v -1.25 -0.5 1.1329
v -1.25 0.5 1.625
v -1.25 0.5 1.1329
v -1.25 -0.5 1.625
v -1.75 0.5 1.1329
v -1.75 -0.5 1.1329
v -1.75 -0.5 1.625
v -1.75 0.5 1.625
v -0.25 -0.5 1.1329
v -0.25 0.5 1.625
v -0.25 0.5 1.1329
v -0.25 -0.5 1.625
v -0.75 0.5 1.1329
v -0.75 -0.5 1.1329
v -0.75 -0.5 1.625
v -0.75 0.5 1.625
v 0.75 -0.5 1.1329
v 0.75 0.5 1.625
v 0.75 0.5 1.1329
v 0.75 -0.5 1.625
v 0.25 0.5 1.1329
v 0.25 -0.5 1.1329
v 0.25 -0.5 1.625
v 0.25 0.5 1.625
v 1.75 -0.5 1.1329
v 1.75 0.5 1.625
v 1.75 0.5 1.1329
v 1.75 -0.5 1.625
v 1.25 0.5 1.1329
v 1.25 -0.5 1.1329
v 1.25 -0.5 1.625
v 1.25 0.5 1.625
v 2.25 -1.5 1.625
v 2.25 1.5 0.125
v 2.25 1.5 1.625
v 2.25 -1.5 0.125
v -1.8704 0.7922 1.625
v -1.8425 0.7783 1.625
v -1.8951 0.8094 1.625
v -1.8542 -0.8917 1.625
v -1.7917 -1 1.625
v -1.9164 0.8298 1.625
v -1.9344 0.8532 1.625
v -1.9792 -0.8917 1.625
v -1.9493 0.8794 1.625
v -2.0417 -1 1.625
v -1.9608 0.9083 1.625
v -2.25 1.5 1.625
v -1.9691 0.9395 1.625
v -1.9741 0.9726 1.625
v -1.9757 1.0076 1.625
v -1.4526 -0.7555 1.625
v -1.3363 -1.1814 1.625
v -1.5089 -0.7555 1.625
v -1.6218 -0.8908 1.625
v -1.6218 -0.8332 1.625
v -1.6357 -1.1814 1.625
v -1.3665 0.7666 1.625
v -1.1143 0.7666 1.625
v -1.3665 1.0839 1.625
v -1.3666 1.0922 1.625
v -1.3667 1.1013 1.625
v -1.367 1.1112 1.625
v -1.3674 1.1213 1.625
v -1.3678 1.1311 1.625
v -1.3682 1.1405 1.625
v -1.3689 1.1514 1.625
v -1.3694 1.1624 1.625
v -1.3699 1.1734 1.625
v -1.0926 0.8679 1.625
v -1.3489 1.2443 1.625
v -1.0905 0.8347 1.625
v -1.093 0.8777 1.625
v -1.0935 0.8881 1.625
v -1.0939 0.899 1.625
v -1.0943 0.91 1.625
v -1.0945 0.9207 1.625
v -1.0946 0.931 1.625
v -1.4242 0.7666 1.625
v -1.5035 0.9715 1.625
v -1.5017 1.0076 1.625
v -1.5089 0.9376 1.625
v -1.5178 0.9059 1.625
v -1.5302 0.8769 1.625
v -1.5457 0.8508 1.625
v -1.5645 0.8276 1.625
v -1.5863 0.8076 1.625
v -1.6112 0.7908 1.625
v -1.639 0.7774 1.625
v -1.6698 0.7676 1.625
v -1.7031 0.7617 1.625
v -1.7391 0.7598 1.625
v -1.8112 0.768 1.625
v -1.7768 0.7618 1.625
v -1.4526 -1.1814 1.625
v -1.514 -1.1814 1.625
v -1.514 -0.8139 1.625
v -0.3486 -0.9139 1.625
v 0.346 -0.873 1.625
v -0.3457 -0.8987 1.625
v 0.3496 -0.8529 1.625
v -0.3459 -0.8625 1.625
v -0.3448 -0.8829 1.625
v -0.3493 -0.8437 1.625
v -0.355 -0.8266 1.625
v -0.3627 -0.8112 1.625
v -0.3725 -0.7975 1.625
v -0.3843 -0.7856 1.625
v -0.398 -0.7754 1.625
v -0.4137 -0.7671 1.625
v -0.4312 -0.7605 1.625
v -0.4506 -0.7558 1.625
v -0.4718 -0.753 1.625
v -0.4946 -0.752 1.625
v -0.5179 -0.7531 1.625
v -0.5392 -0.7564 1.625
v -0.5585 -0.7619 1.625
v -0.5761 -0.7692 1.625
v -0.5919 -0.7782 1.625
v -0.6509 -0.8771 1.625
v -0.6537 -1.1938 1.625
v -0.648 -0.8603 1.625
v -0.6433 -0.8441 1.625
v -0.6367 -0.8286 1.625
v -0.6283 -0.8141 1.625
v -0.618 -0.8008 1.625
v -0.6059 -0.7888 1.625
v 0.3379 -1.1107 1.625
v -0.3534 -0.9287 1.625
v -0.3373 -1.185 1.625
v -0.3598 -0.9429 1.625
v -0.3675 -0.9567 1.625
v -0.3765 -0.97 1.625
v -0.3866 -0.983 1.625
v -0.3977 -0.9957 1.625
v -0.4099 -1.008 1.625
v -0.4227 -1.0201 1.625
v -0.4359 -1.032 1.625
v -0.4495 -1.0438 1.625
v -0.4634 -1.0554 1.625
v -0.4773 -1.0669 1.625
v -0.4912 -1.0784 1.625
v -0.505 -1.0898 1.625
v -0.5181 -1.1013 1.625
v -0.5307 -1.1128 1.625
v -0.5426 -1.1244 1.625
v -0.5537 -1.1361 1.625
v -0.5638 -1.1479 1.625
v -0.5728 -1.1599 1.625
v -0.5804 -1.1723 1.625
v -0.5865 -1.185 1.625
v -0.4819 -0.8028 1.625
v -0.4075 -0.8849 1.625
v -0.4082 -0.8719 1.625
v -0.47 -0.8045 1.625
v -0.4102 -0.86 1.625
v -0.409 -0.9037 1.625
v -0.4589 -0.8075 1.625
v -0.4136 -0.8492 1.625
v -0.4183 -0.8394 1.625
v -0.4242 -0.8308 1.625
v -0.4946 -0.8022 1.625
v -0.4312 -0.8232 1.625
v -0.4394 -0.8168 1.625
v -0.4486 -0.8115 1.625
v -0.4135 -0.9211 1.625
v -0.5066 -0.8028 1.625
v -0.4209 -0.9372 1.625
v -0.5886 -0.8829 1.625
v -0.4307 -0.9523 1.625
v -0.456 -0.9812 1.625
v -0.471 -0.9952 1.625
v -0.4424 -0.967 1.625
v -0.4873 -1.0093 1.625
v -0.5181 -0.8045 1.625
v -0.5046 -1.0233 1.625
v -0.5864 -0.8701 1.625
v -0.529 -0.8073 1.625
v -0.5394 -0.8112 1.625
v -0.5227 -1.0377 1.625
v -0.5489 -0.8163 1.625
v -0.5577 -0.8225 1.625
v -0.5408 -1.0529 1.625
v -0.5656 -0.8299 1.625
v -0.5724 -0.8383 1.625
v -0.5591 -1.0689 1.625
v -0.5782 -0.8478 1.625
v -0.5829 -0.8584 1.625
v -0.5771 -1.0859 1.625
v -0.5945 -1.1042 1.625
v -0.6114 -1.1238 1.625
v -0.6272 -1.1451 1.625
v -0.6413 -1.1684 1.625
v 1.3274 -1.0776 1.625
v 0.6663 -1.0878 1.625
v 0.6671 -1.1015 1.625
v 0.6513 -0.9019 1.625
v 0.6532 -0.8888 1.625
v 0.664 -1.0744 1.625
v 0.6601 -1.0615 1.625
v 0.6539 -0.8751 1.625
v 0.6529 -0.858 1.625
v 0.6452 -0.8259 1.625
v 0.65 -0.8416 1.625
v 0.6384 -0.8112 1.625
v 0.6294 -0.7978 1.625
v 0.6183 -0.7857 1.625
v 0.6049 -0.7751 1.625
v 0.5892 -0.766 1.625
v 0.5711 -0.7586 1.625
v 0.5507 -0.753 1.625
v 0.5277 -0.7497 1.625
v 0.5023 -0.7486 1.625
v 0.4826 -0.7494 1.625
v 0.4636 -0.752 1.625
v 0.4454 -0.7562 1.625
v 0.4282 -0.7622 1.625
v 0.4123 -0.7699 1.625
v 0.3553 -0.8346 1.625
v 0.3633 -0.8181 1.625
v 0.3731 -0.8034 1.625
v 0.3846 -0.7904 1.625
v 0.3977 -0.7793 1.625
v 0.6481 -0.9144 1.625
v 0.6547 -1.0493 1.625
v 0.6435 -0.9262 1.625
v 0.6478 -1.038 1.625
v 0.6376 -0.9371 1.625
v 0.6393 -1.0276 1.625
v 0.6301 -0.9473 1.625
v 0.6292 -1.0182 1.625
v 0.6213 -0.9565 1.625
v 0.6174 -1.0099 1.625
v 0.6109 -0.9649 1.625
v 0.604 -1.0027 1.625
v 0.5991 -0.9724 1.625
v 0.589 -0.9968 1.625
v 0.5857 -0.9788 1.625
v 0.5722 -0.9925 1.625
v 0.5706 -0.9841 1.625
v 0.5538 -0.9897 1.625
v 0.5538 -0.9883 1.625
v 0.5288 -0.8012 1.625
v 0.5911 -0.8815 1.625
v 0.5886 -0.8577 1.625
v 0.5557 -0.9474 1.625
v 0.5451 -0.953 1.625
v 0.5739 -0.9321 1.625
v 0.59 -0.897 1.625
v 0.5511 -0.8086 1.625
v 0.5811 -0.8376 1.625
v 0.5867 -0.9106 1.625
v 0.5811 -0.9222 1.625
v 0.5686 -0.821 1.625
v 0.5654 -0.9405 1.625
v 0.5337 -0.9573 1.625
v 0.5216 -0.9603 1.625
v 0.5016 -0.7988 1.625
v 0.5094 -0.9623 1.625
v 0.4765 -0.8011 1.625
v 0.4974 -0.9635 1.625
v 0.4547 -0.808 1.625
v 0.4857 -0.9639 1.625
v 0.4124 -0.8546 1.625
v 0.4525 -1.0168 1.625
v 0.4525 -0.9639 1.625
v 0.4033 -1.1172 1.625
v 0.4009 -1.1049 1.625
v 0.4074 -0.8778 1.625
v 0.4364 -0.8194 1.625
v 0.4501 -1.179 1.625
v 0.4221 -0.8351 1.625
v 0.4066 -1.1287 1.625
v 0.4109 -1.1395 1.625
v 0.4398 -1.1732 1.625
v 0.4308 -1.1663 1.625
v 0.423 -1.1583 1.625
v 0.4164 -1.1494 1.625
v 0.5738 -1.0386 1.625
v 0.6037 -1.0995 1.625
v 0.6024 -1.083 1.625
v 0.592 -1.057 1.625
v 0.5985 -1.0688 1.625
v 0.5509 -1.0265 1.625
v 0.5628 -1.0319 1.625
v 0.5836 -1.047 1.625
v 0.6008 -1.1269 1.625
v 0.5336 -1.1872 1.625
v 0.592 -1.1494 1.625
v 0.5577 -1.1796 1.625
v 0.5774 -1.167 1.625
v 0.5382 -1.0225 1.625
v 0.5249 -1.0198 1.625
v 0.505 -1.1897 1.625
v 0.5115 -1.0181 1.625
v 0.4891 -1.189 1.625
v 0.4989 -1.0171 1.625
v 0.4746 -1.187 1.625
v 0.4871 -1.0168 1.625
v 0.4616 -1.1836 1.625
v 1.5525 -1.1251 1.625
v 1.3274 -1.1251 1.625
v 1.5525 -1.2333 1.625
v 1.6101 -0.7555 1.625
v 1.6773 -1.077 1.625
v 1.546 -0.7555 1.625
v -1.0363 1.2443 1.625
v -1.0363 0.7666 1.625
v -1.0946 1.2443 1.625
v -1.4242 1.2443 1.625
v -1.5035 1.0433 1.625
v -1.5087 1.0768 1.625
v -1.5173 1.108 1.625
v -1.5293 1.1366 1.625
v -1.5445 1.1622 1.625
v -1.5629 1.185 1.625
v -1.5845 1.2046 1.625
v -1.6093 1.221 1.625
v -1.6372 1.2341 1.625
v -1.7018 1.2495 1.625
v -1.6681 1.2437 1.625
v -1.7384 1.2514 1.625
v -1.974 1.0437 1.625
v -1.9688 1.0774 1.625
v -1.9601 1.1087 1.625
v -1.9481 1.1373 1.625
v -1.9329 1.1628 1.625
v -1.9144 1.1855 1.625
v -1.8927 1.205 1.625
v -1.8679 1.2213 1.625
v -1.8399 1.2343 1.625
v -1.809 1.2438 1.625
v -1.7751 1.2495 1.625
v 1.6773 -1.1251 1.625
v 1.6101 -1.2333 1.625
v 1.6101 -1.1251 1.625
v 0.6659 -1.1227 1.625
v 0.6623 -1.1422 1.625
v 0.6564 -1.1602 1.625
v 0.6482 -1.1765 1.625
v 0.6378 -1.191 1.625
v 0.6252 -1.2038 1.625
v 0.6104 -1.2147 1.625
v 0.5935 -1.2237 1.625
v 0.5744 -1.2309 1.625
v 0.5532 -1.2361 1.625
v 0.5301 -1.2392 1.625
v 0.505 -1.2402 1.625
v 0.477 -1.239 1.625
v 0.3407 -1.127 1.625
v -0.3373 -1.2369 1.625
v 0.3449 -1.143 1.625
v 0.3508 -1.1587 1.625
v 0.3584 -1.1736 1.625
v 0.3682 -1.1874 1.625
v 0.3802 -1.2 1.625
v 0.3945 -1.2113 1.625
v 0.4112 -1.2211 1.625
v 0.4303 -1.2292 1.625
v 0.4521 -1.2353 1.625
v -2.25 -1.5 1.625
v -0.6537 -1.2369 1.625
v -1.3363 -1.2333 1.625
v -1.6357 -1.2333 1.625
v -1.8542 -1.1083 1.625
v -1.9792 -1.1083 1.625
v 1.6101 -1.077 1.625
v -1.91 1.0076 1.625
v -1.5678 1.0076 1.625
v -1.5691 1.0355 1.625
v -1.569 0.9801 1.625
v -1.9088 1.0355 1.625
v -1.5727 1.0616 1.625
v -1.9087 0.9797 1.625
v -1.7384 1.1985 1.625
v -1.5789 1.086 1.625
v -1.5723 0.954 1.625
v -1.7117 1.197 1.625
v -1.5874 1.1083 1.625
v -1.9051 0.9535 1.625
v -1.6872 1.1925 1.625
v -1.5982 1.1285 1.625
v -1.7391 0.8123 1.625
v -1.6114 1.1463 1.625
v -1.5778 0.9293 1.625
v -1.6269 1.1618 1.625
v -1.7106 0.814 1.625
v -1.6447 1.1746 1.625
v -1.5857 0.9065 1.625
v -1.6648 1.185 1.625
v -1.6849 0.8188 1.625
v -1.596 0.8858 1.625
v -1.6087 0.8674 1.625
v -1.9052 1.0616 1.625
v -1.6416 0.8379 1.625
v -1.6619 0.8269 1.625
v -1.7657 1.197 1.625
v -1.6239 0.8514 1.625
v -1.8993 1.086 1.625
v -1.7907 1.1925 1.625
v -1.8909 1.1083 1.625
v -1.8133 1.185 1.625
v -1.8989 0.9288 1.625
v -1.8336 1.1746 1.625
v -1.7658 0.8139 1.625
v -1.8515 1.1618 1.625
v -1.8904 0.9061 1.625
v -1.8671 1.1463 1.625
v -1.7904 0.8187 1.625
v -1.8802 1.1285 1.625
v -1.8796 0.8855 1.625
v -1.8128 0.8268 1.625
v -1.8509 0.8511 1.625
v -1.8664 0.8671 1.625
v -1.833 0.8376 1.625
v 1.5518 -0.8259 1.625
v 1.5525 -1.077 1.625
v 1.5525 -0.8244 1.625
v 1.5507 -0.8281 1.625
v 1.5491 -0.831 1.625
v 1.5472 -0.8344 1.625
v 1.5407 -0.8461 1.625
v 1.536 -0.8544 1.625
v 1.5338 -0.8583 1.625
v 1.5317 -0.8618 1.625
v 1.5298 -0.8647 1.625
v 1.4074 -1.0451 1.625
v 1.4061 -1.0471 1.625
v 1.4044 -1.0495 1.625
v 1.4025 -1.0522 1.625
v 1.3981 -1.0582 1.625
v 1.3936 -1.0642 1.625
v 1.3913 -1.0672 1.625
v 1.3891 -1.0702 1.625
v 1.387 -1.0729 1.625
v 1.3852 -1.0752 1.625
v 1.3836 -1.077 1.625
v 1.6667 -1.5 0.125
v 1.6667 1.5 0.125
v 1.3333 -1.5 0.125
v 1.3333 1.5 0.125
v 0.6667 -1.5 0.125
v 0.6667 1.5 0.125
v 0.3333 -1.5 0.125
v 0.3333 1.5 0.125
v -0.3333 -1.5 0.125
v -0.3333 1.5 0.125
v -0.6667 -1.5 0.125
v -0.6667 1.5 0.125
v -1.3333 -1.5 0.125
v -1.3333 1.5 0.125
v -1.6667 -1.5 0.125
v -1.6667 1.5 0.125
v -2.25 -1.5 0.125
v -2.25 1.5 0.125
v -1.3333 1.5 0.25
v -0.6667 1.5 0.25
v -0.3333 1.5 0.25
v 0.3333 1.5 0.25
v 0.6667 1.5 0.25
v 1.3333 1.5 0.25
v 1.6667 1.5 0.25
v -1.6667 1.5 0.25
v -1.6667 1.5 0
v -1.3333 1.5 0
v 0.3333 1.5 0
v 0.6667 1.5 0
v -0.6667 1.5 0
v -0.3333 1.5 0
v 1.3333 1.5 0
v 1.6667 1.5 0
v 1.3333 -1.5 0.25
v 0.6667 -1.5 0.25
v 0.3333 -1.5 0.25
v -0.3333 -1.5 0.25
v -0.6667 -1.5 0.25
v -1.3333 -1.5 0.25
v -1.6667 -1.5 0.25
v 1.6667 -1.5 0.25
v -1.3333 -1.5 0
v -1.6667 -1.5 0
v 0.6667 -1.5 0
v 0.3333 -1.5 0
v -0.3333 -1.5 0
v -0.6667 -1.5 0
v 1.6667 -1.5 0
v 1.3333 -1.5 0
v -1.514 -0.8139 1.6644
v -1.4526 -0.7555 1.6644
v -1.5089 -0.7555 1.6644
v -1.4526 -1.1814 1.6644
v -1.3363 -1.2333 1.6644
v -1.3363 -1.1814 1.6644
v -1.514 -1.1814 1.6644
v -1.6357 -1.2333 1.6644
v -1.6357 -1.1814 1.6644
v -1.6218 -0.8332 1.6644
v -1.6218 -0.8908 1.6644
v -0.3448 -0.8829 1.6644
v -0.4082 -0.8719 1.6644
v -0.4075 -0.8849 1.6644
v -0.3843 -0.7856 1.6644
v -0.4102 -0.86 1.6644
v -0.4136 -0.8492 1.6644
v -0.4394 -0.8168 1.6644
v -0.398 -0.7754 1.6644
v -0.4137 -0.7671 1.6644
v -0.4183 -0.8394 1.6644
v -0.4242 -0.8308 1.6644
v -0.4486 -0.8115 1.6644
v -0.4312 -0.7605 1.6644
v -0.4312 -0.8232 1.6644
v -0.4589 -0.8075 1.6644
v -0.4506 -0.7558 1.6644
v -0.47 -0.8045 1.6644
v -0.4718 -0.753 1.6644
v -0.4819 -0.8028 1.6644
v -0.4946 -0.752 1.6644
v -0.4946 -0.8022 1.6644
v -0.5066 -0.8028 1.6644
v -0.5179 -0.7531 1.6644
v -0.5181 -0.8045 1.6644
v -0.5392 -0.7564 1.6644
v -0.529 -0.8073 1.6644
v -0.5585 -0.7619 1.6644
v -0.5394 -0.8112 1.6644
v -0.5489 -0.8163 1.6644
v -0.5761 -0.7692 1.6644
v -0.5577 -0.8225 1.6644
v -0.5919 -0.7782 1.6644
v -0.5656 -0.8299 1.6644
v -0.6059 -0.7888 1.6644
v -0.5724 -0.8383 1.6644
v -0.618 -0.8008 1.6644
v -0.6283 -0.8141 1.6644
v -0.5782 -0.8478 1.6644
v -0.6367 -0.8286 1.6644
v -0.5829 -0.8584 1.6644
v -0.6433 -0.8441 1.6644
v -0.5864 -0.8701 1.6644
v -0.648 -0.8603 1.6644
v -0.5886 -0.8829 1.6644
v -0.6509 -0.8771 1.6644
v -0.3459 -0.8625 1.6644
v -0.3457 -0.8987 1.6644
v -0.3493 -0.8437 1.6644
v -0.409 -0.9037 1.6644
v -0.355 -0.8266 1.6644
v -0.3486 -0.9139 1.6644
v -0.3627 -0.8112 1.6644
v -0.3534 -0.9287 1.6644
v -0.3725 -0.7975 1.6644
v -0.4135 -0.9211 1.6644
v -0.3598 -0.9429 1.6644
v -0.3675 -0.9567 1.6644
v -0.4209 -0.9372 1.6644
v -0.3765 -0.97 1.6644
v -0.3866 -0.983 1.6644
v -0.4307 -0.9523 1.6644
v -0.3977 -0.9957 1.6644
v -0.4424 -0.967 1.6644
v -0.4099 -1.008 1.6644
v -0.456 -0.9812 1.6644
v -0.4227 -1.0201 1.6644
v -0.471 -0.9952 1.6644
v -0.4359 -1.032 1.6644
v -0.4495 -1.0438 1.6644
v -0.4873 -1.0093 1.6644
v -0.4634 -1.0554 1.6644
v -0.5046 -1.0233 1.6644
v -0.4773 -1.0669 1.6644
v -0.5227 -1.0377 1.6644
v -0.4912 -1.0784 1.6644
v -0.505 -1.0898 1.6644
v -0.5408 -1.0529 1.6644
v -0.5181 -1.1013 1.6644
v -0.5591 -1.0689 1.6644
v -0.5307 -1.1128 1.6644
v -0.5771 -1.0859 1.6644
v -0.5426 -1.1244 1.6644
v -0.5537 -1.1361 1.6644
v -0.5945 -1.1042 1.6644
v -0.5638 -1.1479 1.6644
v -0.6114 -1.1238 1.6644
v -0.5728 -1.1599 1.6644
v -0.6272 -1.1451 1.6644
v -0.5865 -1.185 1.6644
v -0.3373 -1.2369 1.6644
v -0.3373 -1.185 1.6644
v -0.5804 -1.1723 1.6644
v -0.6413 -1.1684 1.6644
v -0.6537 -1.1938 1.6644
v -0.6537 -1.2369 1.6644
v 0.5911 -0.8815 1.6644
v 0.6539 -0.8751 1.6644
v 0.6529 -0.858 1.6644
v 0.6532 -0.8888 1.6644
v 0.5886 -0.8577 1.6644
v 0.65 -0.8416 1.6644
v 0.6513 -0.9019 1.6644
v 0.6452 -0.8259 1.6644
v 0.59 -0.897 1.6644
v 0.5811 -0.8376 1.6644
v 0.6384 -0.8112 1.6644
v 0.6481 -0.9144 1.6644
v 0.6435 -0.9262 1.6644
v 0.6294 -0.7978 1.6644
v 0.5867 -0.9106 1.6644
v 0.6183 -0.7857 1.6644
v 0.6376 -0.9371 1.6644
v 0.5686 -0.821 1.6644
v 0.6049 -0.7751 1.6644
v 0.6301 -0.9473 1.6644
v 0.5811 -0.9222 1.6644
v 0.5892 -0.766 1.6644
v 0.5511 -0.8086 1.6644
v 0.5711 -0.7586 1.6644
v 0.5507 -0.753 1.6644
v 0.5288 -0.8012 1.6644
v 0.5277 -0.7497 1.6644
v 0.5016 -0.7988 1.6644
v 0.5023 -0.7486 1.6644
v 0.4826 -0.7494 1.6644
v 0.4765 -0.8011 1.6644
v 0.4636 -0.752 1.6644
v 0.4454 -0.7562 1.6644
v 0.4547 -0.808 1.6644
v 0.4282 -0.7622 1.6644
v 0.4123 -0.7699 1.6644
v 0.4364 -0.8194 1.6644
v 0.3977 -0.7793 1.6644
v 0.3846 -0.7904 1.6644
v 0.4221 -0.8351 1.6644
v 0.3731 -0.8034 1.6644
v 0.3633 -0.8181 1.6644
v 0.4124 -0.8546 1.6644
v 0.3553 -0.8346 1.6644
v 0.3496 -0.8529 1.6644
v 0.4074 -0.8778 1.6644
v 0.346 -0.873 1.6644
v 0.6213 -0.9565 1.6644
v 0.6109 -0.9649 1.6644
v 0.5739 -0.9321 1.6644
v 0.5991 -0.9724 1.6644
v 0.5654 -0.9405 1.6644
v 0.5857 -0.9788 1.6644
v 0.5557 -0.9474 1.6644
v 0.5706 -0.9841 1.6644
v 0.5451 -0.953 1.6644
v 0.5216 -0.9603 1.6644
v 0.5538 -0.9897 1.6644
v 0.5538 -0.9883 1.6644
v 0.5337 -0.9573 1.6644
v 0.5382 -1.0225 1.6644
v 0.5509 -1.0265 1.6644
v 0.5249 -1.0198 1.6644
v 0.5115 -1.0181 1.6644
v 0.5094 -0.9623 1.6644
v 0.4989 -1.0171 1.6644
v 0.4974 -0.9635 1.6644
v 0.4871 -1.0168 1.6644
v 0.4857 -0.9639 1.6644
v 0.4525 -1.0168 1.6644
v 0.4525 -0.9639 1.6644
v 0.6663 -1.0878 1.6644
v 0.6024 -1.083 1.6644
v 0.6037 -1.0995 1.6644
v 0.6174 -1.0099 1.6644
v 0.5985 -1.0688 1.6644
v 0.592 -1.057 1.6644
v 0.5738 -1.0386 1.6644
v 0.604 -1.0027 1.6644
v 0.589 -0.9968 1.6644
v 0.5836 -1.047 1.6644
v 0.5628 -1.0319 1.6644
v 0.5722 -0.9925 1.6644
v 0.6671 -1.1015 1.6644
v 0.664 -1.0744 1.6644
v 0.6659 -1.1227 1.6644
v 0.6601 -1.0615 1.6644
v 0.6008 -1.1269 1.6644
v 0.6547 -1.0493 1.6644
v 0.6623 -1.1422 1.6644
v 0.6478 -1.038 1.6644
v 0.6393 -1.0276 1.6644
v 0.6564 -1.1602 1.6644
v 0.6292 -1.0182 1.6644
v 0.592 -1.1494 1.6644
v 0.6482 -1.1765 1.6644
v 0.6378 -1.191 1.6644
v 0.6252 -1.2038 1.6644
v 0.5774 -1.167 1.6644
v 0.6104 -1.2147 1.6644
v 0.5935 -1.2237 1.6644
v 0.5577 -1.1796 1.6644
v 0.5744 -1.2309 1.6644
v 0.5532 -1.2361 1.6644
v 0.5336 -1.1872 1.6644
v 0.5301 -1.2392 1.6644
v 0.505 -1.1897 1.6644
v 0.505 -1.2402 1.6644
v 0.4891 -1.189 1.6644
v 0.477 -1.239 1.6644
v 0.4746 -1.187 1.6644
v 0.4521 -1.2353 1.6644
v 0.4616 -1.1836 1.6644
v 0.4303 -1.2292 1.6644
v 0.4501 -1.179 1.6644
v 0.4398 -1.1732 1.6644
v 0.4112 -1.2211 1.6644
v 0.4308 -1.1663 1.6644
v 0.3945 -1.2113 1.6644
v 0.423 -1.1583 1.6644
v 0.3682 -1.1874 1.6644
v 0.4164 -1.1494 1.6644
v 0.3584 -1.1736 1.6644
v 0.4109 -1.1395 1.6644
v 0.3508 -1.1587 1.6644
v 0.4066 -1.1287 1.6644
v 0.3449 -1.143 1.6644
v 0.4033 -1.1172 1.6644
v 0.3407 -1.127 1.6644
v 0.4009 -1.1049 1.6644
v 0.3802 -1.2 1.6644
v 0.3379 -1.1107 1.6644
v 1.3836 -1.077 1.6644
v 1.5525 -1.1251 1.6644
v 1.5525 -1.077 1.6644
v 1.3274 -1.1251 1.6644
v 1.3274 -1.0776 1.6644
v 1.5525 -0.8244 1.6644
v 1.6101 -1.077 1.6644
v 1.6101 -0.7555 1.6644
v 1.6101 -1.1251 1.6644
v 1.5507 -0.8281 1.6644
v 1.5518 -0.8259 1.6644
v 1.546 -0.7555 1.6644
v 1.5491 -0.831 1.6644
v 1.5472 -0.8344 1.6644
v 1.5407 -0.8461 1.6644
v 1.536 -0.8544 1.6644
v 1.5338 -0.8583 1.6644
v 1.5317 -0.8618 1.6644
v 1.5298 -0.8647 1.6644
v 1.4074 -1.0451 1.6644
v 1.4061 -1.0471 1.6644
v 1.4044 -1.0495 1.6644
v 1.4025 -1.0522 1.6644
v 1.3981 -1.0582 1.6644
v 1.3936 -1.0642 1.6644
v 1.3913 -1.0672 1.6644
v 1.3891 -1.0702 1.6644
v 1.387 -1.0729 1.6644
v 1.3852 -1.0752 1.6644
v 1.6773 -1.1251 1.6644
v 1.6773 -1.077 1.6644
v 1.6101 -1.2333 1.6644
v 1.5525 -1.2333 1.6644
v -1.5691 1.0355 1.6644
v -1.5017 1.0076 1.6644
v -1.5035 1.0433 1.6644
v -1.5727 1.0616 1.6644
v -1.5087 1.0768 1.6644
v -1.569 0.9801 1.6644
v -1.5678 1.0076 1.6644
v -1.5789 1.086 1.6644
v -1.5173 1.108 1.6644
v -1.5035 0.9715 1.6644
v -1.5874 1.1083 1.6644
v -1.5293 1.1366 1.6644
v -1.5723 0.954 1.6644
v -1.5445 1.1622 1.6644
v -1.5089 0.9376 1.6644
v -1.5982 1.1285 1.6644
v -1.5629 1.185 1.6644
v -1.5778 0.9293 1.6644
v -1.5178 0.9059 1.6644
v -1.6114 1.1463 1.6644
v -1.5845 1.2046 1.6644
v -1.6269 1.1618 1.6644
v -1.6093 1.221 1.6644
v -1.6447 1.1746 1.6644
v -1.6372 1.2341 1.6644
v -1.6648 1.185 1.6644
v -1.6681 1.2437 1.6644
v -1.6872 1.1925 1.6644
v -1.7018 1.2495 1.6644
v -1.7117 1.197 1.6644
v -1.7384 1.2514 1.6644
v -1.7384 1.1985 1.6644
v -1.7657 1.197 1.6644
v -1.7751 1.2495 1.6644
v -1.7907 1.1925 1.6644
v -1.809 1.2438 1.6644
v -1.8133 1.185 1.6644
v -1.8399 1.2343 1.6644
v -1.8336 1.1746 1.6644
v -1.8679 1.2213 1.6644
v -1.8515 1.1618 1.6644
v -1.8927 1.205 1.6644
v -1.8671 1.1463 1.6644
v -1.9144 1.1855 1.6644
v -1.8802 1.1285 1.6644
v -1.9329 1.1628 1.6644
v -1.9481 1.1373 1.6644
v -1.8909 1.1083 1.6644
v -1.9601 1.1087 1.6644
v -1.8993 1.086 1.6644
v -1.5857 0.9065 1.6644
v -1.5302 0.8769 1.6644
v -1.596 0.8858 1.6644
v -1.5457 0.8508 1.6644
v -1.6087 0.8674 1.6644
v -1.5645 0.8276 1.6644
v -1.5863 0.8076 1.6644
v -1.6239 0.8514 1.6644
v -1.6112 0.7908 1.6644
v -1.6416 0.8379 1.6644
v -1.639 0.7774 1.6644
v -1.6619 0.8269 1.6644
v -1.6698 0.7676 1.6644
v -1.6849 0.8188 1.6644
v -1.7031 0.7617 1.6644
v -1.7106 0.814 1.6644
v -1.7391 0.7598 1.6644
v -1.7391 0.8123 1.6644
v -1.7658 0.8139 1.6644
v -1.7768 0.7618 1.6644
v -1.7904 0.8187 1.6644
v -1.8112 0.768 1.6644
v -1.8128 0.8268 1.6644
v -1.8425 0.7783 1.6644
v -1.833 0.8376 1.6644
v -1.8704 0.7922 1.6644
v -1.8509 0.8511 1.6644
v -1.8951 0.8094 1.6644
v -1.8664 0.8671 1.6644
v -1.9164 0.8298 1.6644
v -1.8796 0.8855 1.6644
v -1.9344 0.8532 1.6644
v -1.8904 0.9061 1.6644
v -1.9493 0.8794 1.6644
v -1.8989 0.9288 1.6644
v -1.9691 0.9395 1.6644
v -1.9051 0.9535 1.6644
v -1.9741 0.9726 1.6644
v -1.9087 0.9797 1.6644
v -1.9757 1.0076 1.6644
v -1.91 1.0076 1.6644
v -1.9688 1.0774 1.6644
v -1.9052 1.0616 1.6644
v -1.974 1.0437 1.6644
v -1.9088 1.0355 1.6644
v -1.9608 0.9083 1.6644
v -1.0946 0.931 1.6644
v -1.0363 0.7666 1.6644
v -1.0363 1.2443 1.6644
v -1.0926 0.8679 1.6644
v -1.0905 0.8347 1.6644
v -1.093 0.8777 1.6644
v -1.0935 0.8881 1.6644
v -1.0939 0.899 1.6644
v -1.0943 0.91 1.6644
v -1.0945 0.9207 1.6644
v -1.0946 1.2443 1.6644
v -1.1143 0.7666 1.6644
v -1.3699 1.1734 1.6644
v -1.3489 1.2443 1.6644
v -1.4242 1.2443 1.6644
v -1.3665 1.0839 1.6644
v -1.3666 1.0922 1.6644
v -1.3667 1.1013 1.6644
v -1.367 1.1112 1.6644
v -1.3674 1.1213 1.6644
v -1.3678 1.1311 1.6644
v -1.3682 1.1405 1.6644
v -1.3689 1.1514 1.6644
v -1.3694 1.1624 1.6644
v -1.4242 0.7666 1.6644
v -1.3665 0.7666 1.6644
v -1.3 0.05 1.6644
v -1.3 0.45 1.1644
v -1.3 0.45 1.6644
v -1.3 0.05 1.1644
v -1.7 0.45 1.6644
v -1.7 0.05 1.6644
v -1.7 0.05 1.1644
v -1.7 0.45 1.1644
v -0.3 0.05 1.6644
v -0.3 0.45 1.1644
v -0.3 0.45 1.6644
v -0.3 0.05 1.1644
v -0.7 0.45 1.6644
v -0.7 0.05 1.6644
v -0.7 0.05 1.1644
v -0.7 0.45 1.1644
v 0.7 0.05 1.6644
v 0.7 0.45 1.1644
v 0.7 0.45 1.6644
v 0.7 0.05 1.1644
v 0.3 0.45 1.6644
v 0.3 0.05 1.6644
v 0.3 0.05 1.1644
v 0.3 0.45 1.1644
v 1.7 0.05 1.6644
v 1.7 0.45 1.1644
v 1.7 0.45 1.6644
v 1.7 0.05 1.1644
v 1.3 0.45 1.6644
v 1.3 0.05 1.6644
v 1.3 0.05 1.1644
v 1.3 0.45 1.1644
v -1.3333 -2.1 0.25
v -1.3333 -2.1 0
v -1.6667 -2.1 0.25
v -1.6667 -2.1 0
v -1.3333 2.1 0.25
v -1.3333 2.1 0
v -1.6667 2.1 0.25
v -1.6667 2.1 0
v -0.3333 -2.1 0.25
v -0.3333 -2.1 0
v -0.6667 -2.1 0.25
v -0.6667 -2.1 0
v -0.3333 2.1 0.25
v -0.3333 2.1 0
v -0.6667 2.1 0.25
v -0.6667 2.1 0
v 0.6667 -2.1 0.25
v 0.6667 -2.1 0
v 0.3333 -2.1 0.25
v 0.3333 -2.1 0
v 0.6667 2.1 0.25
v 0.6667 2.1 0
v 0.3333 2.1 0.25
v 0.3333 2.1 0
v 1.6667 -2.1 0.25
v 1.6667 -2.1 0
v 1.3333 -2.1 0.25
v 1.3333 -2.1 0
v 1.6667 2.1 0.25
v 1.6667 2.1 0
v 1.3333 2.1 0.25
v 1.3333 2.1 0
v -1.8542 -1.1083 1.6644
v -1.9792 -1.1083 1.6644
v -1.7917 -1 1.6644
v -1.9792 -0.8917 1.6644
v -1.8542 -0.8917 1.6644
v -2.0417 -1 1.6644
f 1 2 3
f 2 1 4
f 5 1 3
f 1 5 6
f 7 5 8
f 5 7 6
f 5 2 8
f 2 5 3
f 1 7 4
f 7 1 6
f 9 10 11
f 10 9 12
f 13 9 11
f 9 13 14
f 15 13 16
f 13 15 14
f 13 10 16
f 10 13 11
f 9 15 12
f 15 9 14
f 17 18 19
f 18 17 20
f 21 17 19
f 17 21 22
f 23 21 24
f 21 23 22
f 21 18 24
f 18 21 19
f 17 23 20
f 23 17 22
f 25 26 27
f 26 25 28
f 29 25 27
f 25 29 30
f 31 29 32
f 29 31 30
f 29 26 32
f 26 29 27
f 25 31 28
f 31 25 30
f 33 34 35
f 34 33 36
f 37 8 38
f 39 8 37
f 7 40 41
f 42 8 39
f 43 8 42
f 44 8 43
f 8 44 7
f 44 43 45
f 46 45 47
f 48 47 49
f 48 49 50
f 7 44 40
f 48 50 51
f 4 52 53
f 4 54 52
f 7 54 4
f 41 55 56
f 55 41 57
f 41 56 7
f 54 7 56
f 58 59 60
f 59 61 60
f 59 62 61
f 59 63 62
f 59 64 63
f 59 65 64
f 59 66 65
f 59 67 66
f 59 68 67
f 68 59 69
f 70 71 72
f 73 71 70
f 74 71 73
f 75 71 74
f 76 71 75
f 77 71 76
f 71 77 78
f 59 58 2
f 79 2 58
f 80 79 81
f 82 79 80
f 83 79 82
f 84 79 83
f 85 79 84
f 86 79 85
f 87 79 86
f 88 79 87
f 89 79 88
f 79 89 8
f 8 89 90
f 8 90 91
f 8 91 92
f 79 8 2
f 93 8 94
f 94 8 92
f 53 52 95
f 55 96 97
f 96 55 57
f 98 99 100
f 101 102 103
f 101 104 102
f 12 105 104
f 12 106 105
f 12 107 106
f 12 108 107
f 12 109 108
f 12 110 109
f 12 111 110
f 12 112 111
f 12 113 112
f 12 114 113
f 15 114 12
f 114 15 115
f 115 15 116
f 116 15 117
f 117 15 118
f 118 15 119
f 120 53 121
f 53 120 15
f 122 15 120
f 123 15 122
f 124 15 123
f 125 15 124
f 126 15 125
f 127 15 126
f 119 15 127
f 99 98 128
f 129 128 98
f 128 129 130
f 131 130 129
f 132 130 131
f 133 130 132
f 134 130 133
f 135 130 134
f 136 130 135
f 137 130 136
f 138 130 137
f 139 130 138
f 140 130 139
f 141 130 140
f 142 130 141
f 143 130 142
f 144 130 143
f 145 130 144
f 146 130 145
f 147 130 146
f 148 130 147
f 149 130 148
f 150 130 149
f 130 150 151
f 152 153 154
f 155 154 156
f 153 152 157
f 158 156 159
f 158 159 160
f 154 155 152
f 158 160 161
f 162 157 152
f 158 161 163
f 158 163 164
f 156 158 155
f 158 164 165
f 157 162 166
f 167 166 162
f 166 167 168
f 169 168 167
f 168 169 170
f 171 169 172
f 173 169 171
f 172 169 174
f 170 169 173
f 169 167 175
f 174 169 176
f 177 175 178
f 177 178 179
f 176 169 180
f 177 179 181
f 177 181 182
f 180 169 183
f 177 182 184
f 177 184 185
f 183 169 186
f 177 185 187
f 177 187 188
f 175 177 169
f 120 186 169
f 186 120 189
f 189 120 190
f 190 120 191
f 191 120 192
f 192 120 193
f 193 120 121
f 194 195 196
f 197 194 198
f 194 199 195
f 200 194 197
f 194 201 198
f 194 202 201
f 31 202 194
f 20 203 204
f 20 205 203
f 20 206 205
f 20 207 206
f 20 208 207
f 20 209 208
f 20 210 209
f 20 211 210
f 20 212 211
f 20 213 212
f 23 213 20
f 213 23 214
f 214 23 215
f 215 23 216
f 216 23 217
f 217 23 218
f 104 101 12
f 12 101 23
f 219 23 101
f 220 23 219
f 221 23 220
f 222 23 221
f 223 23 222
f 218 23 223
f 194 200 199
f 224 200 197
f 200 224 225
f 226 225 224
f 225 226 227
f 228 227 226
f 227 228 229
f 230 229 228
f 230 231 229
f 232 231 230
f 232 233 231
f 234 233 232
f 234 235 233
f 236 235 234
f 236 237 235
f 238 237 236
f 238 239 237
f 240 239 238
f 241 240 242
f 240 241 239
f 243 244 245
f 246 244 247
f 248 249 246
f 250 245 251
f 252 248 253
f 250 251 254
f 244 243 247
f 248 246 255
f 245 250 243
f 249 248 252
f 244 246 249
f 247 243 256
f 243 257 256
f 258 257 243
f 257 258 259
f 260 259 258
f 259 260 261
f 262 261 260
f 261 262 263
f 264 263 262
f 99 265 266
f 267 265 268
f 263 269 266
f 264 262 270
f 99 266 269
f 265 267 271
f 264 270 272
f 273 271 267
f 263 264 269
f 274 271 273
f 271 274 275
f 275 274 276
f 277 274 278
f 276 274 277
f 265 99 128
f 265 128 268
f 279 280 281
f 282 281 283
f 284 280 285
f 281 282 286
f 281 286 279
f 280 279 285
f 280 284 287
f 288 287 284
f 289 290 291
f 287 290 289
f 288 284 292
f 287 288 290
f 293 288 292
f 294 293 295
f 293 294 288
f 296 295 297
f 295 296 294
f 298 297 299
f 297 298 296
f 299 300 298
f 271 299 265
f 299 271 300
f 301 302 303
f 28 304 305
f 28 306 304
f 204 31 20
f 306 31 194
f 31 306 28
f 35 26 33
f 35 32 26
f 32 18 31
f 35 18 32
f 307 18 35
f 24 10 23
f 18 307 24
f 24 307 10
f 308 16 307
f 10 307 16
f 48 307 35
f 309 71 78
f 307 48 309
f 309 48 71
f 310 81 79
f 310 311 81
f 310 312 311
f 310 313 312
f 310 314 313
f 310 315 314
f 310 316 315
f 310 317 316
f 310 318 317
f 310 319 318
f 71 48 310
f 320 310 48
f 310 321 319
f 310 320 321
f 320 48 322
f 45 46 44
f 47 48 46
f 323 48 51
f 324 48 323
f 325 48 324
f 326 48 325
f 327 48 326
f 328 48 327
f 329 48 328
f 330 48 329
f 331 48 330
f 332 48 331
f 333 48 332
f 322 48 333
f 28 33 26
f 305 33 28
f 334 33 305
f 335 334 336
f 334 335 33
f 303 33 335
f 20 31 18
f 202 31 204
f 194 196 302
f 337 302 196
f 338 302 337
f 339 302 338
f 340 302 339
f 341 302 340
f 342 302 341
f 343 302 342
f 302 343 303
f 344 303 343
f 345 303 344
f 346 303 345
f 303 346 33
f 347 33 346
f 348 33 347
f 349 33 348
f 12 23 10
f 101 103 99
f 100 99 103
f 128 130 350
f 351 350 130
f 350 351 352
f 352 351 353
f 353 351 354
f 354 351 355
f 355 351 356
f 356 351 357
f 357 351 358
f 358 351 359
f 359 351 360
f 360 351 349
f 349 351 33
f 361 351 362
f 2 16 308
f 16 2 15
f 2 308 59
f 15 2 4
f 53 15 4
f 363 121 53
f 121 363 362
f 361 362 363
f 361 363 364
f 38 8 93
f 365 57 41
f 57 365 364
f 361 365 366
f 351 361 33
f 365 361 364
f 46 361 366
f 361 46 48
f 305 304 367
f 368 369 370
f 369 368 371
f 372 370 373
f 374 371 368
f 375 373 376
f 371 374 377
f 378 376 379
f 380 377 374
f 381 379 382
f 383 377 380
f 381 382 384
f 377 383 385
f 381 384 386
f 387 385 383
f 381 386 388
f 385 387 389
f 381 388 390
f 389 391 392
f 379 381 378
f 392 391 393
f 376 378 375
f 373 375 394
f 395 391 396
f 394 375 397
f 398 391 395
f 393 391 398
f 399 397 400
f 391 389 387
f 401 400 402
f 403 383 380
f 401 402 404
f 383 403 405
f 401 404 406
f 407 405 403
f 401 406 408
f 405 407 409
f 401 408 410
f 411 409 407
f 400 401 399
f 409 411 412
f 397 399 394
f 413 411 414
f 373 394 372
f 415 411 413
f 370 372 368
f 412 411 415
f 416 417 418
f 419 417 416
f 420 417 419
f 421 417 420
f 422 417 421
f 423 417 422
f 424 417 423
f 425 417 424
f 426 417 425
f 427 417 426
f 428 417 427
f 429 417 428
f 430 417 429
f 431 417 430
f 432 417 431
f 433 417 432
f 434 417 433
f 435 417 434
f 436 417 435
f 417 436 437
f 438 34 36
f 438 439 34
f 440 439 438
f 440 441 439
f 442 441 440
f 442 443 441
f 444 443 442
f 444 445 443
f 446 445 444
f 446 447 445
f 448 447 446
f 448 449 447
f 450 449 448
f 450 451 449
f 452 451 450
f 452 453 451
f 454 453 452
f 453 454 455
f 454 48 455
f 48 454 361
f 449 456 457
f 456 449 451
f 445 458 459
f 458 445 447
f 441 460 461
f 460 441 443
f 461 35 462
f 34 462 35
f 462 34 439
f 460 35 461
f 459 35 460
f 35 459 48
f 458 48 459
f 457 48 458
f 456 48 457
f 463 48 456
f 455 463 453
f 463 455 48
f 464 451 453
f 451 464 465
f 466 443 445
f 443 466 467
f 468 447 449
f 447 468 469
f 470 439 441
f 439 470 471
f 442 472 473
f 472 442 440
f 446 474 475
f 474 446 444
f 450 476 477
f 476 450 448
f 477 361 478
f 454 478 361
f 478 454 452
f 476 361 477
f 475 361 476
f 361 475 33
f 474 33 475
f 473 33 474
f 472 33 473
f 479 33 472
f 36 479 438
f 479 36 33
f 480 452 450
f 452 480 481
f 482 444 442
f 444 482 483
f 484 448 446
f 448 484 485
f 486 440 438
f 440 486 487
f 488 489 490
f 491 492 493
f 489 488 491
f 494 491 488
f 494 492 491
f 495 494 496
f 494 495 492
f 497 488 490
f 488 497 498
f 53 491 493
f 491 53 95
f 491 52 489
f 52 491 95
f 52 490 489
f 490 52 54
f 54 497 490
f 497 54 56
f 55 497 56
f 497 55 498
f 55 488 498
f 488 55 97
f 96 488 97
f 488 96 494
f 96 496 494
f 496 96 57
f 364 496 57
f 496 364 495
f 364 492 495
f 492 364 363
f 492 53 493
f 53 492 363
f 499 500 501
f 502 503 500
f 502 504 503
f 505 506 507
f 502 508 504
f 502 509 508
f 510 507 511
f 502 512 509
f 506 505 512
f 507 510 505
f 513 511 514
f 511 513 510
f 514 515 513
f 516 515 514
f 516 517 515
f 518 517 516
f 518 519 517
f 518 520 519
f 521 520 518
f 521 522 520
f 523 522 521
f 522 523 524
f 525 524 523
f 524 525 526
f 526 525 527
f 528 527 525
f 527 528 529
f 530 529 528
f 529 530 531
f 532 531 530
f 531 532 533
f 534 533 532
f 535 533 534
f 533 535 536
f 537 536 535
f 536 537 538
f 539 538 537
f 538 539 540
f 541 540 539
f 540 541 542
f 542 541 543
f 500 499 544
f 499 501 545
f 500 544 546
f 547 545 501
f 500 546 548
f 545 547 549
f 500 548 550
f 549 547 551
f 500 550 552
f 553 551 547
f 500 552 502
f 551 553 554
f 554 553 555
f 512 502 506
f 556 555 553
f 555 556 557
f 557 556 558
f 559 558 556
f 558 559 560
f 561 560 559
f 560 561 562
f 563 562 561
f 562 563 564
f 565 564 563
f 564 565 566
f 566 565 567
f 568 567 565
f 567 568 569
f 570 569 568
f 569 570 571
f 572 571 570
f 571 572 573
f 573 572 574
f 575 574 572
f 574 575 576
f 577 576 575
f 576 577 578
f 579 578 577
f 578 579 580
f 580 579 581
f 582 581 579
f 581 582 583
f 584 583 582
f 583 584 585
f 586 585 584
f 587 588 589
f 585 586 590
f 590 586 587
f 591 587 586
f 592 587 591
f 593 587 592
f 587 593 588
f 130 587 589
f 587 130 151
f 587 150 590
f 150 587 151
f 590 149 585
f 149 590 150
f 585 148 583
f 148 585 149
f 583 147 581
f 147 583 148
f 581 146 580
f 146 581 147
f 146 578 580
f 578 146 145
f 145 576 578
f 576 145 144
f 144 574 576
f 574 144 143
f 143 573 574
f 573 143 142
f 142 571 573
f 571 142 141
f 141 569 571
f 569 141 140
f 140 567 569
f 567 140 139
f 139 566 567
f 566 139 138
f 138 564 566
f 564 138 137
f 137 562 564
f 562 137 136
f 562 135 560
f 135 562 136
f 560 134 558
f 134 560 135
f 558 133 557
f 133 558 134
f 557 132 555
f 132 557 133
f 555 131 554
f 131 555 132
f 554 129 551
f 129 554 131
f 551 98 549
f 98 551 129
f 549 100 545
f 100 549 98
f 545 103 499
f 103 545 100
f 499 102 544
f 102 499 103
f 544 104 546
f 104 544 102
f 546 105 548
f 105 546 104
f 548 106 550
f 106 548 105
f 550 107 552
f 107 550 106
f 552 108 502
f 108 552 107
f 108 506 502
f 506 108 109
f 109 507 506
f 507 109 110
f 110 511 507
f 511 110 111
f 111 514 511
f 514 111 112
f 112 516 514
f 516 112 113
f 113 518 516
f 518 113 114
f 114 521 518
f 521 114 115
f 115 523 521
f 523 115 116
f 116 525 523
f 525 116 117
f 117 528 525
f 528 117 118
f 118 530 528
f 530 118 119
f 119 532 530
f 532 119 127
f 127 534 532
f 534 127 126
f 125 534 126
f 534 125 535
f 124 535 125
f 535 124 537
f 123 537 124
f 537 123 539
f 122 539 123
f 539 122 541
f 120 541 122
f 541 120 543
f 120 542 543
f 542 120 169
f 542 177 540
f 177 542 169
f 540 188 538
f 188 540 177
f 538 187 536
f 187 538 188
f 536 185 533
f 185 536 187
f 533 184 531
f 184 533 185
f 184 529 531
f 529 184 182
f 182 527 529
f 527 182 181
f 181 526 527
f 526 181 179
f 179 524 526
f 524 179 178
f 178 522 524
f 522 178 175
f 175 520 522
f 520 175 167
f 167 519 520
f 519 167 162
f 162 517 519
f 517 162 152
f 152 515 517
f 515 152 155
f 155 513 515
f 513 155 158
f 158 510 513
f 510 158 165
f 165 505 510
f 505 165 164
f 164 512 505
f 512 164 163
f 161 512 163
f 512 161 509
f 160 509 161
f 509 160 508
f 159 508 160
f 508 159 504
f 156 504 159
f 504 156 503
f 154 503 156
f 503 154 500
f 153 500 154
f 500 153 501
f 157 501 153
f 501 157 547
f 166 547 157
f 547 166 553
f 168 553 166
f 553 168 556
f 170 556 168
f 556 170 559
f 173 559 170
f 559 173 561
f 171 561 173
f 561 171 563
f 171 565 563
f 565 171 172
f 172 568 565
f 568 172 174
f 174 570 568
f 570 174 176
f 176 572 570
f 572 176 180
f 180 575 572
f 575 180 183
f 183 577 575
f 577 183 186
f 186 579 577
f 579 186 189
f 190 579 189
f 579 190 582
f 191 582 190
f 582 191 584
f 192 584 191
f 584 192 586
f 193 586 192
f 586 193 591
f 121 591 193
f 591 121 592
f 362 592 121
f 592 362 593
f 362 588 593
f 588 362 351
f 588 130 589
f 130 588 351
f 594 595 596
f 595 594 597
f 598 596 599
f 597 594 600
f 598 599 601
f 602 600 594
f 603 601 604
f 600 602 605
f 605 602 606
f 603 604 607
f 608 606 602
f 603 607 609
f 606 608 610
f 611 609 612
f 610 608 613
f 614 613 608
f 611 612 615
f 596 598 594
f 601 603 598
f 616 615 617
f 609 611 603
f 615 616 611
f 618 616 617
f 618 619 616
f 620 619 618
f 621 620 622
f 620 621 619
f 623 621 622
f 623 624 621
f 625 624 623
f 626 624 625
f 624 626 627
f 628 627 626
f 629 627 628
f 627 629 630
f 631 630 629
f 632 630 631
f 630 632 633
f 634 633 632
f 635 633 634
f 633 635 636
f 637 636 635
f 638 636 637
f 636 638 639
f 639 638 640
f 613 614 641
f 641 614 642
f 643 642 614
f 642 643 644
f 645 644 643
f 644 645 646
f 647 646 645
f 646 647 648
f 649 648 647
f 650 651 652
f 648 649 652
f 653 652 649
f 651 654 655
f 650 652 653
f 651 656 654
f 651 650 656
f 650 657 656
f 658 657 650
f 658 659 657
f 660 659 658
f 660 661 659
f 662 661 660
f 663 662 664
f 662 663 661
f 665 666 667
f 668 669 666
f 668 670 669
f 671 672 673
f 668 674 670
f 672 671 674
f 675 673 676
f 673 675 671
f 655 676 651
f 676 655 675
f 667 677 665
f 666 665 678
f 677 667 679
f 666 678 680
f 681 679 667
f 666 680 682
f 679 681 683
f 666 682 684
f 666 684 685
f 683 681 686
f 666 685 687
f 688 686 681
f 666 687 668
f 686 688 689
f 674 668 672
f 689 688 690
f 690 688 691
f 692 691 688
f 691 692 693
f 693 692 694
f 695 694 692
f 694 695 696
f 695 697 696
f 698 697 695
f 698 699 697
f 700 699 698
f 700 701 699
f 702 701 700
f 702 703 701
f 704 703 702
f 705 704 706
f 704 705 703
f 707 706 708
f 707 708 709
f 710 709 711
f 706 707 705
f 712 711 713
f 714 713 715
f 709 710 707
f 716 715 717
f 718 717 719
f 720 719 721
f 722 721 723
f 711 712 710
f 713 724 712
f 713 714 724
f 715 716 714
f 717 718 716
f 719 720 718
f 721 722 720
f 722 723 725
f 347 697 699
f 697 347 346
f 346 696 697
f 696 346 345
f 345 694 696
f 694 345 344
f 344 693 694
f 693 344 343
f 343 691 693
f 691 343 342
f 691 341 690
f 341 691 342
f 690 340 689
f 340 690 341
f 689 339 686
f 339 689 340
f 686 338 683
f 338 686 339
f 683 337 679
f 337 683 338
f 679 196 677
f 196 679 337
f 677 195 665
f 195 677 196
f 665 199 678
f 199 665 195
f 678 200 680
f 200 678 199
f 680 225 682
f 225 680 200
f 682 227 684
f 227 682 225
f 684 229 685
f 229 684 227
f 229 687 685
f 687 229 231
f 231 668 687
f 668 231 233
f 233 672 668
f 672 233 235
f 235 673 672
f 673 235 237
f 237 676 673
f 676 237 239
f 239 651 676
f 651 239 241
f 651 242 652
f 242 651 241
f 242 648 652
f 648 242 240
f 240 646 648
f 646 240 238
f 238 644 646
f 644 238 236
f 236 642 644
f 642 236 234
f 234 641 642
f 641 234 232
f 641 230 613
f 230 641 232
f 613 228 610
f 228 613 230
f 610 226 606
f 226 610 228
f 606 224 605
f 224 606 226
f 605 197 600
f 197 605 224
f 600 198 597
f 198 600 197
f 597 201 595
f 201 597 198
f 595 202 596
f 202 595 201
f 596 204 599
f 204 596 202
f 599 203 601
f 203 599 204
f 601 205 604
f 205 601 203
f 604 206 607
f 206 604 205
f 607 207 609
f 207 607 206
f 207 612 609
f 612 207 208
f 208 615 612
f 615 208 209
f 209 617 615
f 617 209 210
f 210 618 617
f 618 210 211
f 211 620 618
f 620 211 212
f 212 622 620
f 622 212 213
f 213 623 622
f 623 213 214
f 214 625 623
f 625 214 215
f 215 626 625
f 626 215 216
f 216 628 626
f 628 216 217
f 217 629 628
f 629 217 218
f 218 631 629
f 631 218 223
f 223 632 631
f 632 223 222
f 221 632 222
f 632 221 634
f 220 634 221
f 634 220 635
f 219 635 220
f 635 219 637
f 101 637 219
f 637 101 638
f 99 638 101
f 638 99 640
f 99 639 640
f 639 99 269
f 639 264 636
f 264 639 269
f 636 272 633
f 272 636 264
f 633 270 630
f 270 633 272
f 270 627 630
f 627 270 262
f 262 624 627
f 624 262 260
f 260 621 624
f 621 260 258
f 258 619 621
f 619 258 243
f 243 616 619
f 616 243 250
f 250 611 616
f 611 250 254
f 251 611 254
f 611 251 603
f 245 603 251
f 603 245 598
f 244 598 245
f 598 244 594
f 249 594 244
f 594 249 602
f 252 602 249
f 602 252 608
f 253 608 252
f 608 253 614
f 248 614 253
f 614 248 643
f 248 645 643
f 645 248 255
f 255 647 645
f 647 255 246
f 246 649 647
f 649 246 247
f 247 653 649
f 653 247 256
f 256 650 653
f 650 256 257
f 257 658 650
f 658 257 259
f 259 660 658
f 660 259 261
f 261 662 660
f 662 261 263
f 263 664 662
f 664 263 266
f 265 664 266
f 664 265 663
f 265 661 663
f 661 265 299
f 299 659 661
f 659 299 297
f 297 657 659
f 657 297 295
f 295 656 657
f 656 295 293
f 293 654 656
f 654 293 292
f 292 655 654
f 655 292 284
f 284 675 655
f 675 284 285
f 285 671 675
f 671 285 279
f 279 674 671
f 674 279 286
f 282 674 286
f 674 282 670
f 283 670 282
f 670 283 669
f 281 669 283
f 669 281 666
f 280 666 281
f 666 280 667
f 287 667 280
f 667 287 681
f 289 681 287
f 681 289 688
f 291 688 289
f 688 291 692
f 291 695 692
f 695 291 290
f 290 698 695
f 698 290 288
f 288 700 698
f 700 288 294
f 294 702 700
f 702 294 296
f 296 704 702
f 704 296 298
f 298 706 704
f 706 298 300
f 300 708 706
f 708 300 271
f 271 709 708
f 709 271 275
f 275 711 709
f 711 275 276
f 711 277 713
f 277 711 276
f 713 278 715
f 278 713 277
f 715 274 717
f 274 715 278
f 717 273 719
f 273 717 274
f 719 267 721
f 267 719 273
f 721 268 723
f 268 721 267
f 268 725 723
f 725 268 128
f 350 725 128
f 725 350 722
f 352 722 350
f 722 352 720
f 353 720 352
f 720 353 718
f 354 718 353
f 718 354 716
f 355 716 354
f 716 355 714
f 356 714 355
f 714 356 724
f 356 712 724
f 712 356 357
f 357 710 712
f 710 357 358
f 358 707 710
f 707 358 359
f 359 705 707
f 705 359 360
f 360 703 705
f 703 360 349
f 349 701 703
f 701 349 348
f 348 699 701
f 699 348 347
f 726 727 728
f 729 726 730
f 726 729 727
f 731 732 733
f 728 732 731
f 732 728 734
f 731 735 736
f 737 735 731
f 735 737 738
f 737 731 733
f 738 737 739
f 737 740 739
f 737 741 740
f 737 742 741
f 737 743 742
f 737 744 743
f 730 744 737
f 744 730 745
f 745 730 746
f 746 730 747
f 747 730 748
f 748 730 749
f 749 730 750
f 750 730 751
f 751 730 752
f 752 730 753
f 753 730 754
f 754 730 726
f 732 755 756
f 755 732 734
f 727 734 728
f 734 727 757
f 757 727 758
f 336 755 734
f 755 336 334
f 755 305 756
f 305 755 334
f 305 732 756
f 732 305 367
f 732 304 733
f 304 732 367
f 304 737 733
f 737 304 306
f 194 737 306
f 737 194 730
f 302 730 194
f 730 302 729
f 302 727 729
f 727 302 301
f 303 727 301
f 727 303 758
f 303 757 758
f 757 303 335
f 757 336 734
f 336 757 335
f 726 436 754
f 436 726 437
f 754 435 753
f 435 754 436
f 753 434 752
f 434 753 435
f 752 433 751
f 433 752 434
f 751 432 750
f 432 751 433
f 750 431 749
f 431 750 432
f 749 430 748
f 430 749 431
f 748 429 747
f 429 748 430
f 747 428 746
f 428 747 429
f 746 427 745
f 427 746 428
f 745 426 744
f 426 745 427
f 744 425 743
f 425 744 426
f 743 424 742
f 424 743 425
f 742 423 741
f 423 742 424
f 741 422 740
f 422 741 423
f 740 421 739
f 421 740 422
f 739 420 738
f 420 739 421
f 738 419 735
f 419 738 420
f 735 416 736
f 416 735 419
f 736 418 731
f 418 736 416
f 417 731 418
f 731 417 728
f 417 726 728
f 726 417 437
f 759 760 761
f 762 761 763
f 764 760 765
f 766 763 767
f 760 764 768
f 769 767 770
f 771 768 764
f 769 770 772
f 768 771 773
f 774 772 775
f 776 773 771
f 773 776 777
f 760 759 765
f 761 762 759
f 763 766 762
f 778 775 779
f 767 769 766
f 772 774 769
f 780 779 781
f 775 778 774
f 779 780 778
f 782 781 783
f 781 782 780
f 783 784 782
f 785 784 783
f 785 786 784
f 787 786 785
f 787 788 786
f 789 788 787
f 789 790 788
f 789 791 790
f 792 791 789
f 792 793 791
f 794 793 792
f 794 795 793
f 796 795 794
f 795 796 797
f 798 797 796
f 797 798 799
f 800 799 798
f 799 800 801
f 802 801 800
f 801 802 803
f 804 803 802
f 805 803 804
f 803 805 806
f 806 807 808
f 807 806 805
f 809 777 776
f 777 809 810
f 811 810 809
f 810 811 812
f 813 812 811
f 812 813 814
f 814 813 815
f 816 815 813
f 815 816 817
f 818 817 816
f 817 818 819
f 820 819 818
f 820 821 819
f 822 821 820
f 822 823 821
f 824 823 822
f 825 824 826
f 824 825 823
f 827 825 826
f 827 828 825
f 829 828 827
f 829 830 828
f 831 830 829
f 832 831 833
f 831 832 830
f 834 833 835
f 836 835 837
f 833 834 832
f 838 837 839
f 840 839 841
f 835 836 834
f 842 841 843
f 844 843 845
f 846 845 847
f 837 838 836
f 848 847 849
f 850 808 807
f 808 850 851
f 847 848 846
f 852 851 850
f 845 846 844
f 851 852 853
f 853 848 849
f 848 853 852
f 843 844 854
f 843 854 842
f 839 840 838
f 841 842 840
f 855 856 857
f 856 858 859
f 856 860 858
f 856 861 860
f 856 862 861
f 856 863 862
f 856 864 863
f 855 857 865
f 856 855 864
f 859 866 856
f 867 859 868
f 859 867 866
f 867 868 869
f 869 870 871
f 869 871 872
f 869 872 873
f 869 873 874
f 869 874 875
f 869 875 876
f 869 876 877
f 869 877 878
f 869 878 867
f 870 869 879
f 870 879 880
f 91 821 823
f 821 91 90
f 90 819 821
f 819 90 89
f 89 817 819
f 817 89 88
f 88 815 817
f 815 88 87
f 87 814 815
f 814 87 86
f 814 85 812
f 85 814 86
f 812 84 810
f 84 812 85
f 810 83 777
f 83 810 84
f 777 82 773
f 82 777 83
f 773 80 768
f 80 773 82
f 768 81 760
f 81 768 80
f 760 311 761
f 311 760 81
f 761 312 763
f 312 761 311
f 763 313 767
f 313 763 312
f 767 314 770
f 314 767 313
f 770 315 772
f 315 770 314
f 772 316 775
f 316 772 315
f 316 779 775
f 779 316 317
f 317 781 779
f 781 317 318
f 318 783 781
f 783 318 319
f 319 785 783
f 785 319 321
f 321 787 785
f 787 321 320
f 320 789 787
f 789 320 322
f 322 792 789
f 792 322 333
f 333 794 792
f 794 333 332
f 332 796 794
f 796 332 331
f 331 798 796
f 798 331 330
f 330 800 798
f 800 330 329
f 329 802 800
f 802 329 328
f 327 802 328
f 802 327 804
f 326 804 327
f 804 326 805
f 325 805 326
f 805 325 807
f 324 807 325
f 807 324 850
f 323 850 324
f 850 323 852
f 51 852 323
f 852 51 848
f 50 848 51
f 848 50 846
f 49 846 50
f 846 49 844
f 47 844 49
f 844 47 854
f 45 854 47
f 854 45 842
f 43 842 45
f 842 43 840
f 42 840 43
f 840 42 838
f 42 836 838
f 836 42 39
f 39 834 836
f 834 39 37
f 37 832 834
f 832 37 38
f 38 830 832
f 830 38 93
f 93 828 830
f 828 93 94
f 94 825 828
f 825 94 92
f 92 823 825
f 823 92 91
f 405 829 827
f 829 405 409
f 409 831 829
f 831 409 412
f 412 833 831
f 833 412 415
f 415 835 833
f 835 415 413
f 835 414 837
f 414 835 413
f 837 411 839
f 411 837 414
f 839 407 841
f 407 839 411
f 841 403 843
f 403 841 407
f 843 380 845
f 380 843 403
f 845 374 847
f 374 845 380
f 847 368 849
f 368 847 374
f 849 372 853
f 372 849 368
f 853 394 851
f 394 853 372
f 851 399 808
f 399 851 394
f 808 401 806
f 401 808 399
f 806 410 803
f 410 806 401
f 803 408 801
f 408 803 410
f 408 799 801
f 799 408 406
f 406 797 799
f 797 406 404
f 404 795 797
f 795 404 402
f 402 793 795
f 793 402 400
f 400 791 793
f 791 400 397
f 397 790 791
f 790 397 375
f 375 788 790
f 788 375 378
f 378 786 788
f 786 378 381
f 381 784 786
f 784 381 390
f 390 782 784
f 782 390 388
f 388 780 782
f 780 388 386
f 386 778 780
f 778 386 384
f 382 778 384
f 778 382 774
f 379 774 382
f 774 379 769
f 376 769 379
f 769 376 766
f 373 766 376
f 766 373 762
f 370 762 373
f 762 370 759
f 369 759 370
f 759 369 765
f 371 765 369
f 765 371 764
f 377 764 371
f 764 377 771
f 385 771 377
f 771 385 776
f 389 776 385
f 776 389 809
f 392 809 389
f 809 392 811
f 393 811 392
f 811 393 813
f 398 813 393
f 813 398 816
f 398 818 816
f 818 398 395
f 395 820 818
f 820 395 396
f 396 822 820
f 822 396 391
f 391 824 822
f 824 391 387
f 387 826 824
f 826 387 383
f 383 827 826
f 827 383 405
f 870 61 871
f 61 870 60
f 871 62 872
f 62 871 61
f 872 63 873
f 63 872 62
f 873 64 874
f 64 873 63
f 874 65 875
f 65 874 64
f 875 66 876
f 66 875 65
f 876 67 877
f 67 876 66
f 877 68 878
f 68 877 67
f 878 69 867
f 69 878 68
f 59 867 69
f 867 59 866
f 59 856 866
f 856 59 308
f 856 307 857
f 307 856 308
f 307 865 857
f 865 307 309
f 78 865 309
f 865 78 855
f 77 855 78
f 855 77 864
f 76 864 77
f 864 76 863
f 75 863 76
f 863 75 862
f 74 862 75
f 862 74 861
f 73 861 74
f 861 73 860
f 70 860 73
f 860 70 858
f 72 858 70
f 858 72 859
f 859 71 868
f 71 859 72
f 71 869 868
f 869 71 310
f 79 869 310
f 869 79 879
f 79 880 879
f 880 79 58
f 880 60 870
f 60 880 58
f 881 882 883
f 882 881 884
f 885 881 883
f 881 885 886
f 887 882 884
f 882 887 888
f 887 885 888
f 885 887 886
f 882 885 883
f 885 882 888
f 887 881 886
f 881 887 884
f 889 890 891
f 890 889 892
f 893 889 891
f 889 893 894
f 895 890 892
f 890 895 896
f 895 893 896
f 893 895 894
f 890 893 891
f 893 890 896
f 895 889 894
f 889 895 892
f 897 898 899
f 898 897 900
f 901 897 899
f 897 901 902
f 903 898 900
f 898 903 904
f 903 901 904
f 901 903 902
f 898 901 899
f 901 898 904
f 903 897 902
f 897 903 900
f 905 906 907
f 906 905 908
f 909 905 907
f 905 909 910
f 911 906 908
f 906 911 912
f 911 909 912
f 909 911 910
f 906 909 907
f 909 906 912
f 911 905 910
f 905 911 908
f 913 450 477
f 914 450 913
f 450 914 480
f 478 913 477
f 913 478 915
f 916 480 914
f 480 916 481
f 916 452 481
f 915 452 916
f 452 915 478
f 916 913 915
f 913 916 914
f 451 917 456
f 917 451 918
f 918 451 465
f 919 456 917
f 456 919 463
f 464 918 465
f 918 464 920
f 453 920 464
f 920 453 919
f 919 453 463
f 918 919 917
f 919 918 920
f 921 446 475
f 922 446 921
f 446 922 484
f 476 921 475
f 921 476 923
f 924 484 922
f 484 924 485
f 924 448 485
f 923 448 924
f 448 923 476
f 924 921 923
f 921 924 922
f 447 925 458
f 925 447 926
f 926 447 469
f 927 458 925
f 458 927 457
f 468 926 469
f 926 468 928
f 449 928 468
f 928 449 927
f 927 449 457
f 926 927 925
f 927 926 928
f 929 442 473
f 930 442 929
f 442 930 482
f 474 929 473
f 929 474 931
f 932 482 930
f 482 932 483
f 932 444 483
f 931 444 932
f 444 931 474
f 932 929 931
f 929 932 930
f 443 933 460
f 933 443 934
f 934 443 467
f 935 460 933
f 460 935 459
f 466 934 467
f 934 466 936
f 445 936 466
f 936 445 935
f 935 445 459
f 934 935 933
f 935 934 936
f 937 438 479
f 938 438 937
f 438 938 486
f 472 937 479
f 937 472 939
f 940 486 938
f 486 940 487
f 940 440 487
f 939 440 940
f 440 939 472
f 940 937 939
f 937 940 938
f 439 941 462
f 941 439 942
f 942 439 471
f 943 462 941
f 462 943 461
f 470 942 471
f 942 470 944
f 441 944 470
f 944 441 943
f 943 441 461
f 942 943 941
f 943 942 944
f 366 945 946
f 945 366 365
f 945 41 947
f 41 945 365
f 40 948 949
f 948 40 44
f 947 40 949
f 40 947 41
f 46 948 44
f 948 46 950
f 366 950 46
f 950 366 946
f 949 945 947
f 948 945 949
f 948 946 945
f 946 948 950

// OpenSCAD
/*
Open freecad, select Workbench OpenSCAD
import file, select group and export to
VRML 2.0 (wrl file)
https://www.freecadweb.org/wiki/Import_OpenSCAD_code
*/

n_switches=4; // number of dip switches
pitch=2.54; // pin pitch

body=[(n_switches+0.5)*pitch, 3*pitch, 1.5*pitch];
height=pitch/8; // body above z axis
color_body="maroon";

swhole=[pitch*0.5,pitch,pitch*0.5];
button=[pitch*0.4,pitch*0.4,pitch*0.5];
color_button="white";

font = "Liberation Sans";
letter_size = pitch/2;
letter_height = pitch/16;
color_letter="white";

color_pin="white";

module letter(l,scale=1)
{
  // Use linear_extrude() to make the letters 3D objects as they
  // are only 2D shapes when only using text()
  linear_extrude(height = letter_height*scale)
  {
	text(l, size = letter_size*scale, font = font, halign = "center",
     valign = "center", $fn = 16);
  }
}

// 2 pins for 1 switch
module pin_smd()
{
  translate([0,0,pitch/8])
      cube([pitch/3,pitch*0.75,pitch/4],center=true);
}

module inscription(scale=1)
{
  translate([
    (0-n_switches/2+0.5)*pitch,
    body[1]/2-letter_size,
    body[2]/2-letter_height*scale])
      letter("ON");
  for(i = [0:n_switches-1])
  {
    translate([
    (i-n_switches/2+0.5)*pitch,
      -body[1]/2+letter_size,
      body[2]/2-letter_height*scale])
      letter(chr(48+(i+1)%10));
  }
}

module dipsw_smd()
{
  translate([0,0,body[2]/2+height]) // little above
    union()
    {
      // cut off holes for switches
      difference()
      {
        color(color_body)
          cube(body,center=true);
        // holes for switches
        for(i = [0:n_switches-1])
        {
          translate([(i-n_switches/2+0.5)*pitch,0,body[2]/2-swhole[2]/2+0.02])
            color(color_body)
              cube(swhole,center=true);
        }
        // cut off space for letters
        if(0)
        translate([0,0,0.1])
          color(color_body)
            inscription(scale=1.1);
      }
      // place letters
      translate([0,0,0.1])
        color(color_letter)
          inscription();
      // buttons
      for(i = [0:n_switches-1])
      {
        translate([(i-n_switches/2+0.5)*pitch,swhole[1]/2-button[1]/2-(swhole[0]-button[0])/2,body[2]/2-button[2]/2+0.1])
          color(color_pin)
            cube(button,center=true);
      }
      // pin 1 mark
      translate([(-body[0])/2+pitch/3,-body[1]/2+pitch/2,body[2]/2])
        color(color_letter)
          cylinder(r=pitch/8,h=0.1,$fn=6);

      // the pins
      for(i = [0:n_switches-1])
      {
        // pins
        for(j = [-1:2:1])
          translate([(i-n_switches/2+0.5)*pitch,  j*(body[1]/2+pitch*0.6/2),-body[2]/2-height+pitch/8])
            color(color_pin)
              cube([pitch/3,pitch*0.6,pitch/4],center=true);
      }
      
   }
}

scale(1/2.54) // required scale for KiCAD VRML file dipswitch_smd.wrl
//  rotate([0,0,90])
    dipsw_smd();
